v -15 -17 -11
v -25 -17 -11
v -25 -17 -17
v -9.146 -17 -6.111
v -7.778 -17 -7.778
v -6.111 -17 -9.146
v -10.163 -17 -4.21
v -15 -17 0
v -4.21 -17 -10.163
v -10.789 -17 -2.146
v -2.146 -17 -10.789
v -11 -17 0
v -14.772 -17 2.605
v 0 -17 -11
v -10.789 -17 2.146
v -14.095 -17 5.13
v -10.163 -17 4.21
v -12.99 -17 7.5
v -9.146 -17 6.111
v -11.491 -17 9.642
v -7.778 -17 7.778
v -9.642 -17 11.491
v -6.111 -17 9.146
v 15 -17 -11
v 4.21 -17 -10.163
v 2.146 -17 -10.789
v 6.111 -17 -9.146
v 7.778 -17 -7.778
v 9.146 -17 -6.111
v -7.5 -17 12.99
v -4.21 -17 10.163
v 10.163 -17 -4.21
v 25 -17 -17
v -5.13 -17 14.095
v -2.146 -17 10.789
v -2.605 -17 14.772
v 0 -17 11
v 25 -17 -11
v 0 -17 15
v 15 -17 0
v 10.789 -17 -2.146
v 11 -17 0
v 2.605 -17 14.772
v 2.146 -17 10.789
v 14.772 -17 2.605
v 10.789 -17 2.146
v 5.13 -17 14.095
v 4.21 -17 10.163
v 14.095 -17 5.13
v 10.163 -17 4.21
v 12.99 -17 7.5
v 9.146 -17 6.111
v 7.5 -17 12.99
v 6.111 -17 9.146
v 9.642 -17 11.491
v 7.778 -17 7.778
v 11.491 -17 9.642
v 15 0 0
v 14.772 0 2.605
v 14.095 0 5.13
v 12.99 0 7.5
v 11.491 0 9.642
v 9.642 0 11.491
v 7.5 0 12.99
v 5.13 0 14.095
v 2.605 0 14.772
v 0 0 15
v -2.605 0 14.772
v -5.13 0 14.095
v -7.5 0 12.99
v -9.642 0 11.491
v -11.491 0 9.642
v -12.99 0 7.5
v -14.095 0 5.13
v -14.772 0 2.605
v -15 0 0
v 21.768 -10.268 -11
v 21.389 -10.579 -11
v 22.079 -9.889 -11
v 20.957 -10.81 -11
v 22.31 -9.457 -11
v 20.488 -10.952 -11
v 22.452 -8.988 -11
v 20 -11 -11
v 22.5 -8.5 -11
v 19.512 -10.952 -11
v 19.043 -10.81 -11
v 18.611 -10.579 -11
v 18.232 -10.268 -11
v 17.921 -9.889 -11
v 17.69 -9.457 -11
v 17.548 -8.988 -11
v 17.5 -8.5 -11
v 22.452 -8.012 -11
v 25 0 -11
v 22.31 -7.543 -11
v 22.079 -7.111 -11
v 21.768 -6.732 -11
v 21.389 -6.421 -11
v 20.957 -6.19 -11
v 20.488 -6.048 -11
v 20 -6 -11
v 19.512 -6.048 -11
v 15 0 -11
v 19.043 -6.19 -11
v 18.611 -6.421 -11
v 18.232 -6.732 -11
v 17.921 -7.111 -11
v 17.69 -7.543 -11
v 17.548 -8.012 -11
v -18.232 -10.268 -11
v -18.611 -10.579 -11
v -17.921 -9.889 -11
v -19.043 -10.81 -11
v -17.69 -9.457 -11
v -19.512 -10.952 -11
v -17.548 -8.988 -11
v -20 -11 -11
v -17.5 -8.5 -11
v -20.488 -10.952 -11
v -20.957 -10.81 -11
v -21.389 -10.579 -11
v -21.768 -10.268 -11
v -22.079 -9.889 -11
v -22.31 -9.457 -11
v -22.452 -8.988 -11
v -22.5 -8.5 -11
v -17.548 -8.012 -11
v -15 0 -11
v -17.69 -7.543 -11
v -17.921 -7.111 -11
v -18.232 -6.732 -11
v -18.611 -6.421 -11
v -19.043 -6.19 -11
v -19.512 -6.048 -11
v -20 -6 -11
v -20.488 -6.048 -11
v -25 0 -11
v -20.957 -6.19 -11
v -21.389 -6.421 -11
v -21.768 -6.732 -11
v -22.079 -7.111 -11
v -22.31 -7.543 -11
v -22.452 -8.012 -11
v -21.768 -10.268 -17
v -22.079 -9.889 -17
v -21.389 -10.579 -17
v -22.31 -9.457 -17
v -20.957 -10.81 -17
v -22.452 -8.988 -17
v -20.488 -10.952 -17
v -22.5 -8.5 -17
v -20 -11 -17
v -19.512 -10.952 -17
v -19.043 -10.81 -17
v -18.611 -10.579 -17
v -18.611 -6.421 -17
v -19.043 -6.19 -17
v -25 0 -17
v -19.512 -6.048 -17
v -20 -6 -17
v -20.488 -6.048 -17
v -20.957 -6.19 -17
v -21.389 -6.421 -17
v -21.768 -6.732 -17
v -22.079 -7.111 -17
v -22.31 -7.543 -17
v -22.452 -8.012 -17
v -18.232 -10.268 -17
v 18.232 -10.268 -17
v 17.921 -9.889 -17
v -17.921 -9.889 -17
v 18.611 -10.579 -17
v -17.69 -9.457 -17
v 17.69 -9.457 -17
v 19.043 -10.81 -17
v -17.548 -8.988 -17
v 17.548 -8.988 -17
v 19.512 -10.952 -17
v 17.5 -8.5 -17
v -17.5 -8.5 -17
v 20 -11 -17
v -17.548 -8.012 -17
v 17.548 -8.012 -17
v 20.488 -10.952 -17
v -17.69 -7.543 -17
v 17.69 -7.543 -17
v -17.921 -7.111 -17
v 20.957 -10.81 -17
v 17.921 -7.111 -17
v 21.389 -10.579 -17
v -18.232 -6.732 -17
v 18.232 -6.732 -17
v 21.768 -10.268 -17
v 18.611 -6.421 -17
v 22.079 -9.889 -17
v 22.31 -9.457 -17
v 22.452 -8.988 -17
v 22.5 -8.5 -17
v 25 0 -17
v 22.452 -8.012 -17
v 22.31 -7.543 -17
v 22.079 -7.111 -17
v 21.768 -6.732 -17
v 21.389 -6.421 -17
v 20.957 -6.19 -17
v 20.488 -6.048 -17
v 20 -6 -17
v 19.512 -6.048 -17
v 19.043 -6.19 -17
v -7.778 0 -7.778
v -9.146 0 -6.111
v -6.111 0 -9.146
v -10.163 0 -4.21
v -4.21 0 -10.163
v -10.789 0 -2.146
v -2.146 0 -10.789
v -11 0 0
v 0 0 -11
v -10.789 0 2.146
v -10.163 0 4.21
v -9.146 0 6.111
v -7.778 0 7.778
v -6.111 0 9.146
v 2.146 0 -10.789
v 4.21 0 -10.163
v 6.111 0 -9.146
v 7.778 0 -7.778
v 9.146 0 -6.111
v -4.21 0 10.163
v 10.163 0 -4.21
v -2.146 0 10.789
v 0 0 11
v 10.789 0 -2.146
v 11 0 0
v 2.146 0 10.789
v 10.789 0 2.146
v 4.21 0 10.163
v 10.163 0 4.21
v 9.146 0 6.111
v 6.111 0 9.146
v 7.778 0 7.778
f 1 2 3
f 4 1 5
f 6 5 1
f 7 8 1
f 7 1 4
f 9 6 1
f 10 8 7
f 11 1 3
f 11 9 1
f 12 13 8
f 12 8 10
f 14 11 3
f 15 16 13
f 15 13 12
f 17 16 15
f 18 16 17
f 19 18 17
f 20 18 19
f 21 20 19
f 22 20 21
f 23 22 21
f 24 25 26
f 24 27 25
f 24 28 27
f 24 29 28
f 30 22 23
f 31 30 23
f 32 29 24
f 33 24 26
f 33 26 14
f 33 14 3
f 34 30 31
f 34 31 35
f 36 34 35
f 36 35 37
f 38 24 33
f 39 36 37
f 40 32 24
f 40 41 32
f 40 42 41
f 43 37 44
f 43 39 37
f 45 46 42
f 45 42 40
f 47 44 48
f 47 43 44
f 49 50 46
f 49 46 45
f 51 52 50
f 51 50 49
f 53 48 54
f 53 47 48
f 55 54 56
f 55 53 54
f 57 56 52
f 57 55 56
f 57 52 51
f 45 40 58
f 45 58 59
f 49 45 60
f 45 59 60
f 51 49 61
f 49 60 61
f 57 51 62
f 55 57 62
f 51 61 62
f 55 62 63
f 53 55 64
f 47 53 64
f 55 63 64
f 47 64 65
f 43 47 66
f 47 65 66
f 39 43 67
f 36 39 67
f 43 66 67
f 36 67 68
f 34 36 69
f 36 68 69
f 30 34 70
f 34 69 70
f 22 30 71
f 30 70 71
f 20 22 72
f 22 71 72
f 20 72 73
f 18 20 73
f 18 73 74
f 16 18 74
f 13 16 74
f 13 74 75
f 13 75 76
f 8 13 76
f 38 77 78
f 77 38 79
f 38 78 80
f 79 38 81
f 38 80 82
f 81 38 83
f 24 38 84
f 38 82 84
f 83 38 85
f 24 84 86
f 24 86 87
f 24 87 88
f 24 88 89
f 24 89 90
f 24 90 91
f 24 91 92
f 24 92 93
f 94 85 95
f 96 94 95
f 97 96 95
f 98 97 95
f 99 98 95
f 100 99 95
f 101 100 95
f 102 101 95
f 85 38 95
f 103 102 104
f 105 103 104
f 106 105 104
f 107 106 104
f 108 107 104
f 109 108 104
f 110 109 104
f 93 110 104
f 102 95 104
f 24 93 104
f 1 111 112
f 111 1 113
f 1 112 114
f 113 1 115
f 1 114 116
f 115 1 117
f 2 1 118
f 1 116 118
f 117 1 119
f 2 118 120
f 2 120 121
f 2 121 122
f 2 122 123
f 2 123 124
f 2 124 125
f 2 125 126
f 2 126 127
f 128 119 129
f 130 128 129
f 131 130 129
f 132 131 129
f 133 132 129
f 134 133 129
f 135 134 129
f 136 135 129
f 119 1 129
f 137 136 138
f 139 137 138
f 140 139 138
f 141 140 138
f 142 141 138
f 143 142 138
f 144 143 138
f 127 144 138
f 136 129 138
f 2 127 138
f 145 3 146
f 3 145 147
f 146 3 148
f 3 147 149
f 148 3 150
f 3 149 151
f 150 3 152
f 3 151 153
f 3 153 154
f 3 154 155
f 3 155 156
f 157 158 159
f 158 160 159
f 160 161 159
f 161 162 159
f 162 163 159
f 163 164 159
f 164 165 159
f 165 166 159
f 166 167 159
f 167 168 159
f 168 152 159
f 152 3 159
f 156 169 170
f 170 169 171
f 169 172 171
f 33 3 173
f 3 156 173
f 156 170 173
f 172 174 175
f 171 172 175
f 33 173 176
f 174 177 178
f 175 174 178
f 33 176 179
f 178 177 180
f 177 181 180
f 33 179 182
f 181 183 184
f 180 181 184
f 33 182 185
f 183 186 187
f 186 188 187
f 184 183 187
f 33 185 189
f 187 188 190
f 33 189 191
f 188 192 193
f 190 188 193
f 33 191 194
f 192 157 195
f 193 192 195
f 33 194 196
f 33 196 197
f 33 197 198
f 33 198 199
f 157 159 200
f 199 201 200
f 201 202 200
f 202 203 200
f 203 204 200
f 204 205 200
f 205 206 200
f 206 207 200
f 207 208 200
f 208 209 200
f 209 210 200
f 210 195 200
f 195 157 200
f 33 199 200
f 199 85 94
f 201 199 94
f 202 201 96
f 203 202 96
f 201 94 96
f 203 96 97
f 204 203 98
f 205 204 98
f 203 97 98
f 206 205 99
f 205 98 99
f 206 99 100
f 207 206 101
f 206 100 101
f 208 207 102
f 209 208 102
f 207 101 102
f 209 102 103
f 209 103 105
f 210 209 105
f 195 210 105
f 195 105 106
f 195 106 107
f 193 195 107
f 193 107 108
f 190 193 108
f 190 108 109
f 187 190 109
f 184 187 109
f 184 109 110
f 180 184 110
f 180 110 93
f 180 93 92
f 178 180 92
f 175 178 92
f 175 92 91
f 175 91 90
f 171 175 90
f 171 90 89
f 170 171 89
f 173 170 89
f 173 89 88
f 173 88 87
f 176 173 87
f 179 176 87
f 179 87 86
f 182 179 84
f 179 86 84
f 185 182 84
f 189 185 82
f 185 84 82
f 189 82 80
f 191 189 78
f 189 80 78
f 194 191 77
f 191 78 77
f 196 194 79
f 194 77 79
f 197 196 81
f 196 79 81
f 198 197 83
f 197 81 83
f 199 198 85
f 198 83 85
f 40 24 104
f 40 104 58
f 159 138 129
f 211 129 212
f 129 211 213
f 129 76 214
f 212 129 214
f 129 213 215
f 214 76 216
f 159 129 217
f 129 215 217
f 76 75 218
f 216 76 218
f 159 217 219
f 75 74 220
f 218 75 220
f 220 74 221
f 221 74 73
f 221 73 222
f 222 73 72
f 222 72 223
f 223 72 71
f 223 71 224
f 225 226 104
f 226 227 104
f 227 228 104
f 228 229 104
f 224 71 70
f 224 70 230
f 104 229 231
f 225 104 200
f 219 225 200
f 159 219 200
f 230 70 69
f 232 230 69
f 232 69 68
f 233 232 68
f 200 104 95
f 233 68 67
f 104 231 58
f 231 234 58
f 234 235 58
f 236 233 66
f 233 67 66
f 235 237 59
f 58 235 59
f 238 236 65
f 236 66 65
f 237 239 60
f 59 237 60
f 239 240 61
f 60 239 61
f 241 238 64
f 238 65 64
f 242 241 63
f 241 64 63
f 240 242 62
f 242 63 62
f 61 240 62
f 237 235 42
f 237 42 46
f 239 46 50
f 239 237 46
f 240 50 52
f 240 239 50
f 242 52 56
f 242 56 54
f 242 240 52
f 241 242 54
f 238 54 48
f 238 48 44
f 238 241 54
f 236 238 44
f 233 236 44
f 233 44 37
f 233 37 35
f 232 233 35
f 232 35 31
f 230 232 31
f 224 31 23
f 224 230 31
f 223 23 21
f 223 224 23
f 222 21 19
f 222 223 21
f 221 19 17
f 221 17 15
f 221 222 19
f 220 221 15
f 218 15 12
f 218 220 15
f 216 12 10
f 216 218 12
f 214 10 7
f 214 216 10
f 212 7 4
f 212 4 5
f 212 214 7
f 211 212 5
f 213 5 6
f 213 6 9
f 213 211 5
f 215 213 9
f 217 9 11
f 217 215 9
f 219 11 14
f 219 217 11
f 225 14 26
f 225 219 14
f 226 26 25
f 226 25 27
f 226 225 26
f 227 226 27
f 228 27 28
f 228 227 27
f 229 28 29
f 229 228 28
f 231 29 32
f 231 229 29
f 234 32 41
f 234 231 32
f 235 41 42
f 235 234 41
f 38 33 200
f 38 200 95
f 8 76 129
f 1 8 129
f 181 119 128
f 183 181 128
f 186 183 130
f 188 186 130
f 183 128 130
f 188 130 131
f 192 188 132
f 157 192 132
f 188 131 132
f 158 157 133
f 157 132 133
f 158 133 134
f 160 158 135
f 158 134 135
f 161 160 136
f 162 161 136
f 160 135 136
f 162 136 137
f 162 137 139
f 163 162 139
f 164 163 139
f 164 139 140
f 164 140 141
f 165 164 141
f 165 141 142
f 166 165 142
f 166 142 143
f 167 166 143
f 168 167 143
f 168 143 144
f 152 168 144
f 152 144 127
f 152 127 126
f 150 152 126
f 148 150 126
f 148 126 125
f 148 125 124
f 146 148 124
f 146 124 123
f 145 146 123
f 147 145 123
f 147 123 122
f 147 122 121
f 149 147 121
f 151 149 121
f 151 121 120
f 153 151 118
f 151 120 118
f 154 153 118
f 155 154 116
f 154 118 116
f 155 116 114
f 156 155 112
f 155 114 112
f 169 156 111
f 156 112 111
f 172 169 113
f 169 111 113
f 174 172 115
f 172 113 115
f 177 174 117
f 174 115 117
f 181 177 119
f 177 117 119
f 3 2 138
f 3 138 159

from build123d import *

# Parameters (mm, degrees)
F0_R     = 11
F1_DEPTH = 17
F2_R     = 2.5
F3_DEPTH = 6.001


with BuildPart() as f1:
    # F0 (on Front) → F1 (new body)
    with BuildSketch(Plane.XZ):
        with BuildLine():
            ThreePointArc((-15, 0), (0, -15), (15, 0))
            ThreePointArc((15, 0), (0, 15), (-15, 0))
        make_face()
        Circle(F0_R, mode=Mode.SUBTRACT)
        with BuildLine():
            Line((15, -11), (15, 0))
            ThreePointArc((15, 0), (0, -15), (-15, 0))
            Line((-15, 0), (-15, -11))
            Line((-15, -11), (-25, -11))
            Line((-25, -11), (-25, -17))
            Line((-25, -17), (25, -17))
            Line((25, -17), (25, -11))
            Line((25, -11), (15, -11))
        make_face()
    extrude(amount=F1_DEPTH)

    # F2 (on face) → F3 (cut, through all)
    with BuildSketch(Plane.XY.offset(-11)):
        with Locations((-20, -8.5)):
            Circle(F2_R)
        with Locations((20, -8.5)):
            Circle(F2_R)
    extrude(amount=-F3_DEPTH, mode=Mode.SUBTRACT)


solid = f1.part
